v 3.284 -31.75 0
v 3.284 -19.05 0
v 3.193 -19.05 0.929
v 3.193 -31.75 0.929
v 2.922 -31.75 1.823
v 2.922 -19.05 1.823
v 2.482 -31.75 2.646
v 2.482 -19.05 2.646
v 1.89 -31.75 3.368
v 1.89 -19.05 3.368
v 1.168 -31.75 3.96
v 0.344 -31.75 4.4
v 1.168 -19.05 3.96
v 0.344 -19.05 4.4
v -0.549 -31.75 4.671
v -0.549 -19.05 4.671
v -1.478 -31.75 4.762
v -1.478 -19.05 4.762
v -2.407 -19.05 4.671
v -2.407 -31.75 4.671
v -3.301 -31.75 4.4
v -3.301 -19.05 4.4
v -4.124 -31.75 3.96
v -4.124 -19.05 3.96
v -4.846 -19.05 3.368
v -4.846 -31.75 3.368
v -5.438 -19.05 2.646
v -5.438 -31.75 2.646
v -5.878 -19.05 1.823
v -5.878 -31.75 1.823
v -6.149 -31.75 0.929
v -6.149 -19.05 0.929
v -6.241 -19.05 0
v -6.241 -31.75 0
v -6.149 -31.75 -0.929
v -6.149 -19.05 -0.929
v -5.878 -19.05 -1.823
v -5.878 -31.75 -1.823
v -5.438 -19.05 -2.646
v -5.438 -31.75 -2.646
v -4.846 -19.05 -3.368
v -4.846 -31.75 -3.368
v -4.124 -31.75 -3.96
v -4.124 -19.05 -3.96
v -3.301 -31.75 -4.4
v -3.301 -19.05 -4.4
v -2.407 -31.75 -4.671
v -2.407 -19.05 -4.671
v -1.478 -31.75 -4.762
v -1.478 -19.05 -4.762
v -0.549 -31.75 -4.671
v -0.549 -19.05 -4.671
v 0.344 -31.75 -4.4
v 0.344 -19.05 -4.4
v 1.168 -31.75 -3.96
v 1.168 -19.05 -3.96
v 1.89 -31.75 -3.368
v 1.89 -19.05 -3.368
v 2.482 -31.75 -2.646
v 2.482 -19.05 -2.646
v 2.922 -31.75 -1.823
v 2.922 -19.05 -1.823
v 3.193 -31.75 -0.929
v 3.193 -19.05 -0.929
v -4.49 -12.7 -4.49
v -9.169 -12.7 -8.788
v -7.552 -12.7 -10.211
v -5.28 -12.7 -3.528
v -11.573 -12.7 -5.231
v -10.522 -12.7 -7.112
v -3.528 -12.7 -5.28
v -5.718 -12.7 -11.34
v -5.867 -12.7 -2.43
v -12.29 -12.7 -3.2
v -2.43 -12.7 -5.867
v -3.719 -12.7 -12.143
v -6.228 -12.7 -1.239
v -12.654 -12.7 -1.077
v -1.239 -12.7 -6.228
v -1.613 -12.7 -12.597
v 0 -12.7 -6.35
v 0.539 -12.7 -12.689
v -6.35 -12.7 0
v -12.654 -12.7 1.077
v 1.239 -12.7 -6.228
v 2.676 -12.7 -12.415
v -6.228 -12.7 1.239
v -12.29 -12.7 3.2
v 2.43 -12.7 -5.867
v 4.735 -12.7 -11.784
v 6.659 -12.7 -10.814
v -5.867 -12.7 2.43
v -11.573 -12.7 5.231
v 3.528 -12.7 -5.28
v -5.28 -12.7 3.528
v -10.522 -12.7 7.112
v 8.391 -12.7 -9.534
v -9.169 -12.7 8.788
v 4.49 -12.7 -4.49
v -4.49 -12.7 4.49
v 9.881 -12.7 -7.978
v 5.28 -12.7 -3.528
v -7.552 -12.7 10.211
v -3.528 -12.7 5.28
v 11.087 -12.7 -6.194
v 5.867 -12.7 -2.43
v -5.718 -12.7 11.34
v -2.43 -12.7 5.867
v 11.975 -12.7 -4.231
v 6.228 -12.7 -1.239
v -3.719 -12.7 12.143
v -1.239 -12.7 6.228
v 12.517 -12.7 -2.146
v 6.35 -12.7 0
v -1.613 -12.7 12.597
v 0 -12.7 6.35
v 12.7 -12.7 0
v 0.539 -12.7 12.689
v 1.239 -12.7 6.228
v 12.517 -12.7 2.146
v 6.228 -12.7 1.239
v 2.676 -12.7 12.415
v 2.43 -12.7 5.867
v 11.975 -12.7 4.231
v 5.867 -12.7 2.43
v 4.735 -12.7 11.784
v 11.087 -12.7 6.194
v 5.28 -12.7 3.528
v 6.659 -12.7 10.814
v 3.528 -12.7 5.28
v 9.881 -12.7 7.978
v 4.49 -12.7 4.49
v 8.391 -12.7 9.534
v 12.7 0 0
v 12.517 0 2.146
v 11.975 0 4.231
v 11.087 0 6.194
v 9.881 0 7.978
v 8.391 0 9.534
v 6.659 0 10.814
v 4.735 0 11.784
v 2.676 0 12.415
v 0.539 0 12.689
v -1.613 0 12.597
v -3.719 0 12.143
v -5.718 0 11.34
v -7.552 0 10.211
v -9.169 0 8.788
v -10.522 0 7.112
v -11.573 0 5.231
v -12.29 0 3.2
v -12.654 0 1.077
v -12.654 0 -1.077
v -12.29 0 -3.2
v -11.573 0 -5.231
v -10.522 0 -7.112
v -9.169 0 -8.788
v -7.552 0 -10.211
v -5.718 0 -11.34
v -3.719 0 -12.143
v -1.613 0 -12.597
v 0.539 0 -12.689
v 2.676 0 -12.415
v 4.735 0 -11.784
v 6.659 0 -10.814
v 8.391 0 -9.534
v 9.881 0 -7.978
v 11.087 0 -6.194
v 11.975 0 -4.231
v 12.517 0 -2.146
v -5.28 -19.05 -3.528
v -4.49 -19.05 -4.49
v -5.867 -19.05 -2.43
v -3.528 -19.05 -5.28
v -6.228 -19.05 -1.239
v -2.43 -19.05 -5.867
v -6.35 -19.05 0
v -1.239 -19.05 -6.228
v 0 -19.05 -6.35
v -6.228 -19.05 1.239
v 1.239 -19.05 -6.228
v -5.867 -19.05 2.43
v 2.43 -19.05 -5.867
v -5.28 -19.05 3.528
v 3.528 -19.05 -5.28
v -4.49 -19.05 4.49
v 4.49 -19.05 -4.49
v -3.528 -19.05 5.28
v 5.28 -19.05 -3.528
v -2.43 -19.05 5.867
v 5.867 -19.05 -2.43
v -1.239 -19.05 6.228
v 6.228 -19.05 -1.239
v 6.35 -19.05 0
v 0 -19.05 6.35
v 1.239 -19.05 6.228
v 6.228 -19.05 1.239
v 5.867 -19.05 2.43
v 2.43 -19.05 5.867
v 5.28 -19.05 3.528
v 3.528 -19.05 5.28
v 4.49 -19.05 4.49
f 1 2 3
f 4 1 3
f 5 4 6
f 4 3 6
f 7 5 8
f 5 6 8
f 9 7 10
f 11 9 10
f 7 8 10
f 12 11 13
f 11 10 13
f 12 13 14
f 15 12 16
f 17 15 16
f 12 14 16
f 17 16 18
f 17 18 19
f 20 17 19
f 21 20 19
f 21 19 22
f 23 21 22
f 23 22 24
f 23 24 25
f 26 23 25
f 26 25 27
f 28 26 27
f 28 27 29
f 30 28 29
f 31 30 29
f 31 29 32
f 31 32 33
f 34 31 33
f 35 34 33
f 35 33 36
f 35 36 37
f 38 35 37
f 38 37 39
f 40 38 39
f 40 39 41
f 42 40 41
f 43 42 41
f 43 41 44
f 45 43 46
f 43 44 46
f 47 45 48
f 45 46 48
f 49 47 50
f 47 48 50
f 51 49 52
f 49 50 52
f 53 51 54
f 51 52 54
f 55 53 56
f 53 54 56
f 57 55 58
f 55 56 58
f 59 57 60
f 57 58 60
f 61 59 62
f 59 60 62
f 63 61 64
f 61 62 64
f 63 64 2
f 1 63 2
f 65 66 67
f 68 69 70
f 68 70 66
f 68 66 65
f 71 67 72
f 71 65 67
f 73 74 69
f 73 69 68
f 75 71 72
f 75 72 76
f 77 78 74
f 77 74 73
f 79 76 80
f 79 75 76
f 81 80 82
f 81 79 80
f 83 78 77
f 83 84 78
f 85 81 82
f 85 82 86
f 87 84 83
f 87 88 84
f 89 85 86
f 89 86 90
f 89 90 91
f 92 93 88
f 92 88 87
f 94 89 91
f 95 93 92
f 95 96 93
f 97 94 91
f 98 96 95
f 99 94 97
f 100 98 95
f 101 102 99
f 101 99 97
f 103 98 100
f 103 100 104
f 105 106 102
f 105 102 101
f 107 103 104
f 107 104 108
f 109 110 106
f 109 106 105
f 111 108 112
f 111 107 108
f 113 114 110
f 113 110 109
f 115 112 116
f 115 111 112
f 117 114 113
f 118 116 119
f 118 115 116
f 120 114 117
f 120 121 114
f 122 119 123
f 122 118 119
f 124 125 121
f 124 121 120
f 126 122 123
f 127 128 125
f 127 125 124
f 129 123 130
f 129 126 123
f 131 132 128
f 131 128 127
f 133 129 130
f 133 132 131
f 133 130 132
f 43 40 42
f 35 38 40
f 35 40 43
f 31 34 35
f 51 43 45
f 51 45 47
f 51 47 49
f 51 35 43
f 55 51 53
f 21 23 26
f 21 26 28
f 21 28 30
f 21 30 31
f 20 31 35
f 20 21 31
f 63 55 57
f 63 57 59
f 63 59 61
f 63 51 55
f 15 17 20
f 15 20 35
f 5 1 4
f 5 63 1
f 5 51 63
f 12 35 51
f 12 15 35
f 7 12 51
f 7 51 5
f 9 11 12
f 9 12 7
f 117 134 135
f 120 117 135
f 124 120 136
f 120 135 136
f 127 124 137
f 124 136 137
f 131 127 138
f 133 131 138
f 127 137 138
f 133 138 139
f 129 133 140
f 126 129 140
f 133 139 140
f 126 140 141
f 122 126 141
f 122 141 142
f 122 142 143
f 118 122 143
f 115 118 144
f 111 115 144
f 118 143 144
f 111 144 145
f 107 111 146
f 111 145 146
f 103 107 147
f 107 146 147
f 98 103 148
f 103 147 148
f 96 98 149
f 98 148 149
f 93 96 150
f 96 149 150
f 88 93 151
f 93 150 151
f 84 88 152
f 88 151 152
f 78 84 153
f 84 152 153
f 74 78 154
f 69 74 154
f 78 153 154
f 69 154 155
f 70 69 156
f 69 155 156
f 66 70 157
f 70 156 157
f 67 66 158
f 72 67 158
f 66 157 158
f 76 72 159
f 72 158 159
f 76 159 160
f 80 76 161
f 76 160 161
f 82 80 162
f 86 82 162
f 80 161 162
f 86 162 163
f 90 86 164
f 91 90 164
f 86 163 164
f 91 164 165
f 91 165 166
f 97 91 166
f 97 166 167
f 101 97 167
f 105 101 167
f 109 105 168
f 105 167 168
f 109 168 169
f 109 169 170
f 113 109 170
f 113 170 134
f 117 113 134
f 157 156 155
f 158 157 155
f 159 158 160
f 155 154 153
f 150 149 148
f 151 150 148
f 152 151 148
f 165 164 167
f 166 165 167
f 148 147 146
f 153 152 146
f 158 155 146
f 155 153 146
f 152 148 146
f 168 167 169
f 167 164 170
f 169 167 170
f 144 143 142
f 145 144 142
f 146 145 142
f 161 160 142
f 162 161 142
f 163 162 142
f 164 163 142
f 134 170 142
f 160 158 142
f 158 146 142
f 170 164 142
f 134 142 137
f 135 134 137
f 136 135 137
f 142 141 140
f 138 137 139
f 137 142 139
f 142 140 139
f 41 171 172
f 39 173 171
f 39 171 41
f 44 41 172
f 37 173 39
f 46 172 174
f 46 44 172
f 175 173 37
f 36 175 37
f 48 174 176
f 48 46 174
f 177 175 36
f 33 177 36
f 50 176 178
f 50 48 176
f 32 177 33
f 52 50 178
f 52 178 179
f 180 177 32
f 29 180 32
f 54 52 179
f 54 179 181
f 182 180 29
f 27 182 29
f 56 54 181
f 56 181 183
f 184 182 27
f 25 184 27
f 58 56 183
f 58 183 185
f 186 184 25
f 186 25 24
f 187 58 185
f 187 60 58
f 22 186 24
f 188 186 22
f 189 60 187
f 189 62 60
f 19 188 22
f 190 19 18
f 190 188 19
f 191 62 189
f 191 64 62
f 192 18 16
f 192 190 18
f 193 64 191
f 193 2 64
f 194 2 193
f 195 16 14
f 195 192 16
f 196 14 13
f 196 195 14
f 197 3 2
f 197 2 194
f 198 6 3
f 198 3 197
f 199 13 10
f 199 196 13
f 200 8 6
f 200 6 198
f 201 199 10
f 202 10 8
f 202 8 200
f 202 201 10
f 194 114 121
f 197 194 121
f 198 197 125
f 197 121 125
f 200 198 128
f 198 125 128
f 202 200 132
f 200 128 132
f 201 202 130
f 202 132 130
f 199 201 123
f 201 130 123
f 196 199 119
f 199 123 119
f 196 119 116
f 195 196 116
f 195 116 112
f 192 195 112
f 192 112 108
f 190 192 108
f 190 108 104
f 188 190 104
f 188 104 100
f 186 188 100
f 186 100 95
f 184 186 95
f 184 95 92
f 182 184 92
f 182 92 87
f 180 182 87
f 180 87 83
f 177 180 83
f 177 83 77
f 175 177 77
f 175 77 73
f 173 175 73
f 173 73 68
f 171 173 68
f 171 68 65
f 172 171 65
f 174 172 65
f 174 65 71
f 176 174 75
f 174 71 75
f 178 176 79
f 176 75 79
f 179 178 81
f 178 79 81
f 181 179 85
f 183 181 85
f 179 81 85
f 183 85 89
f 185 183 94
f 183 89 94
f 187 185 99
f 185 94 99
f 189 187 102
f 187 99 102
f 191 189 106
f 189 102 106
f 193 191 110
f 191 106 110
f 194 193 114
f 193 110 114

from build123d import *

# Parameters (mm, degrees)
F0_R     = 12.7
F0_R_2   = 6.35
F0_R_3   = 4.7625
F1_DEPTH = 12.7
F2_DEPTH = 19.05
F3_DEPTH = 31.75


with BuildPart() as f1:
    # F0 (on Front) → F1 (new body)
    with BuildSketch(Plane.XZ):
        Circle(F0_R)
        Circle(F0_R_2, mode=Mode.SUBTRACT)
        with Locations((-1.478096, 0)):
            Circle(F0_R_3)
        Circle(F0_R_2)
        with Locations((-1.478096, 0)):
            Circle(F0_R_3, mode=Mode.SUBTRACT)
    extrude(amount=F1_DEPTH)

    # F0 (on Front) → F2 (join)
    with BuildSketch(Plane.XZ):
        with Locations((-1.478096, 0)):
            Circle(F0_R_3)
        Circle(F0_R_2)
        with Locations((-1.478096, 0)):
            Circle(F0_R_3, mode=Mode.SUBTRACT)
    extrude(amount=F2_DEPTH)

    # F0 (on Front) → F3 (join)
    with BuildSketch(Plane.XZ):
        with Locations((-1.478096, 0)):
            Circle(F0_R_3)
    extrude(amount=F3_DEPTH)


solid = f1.part
